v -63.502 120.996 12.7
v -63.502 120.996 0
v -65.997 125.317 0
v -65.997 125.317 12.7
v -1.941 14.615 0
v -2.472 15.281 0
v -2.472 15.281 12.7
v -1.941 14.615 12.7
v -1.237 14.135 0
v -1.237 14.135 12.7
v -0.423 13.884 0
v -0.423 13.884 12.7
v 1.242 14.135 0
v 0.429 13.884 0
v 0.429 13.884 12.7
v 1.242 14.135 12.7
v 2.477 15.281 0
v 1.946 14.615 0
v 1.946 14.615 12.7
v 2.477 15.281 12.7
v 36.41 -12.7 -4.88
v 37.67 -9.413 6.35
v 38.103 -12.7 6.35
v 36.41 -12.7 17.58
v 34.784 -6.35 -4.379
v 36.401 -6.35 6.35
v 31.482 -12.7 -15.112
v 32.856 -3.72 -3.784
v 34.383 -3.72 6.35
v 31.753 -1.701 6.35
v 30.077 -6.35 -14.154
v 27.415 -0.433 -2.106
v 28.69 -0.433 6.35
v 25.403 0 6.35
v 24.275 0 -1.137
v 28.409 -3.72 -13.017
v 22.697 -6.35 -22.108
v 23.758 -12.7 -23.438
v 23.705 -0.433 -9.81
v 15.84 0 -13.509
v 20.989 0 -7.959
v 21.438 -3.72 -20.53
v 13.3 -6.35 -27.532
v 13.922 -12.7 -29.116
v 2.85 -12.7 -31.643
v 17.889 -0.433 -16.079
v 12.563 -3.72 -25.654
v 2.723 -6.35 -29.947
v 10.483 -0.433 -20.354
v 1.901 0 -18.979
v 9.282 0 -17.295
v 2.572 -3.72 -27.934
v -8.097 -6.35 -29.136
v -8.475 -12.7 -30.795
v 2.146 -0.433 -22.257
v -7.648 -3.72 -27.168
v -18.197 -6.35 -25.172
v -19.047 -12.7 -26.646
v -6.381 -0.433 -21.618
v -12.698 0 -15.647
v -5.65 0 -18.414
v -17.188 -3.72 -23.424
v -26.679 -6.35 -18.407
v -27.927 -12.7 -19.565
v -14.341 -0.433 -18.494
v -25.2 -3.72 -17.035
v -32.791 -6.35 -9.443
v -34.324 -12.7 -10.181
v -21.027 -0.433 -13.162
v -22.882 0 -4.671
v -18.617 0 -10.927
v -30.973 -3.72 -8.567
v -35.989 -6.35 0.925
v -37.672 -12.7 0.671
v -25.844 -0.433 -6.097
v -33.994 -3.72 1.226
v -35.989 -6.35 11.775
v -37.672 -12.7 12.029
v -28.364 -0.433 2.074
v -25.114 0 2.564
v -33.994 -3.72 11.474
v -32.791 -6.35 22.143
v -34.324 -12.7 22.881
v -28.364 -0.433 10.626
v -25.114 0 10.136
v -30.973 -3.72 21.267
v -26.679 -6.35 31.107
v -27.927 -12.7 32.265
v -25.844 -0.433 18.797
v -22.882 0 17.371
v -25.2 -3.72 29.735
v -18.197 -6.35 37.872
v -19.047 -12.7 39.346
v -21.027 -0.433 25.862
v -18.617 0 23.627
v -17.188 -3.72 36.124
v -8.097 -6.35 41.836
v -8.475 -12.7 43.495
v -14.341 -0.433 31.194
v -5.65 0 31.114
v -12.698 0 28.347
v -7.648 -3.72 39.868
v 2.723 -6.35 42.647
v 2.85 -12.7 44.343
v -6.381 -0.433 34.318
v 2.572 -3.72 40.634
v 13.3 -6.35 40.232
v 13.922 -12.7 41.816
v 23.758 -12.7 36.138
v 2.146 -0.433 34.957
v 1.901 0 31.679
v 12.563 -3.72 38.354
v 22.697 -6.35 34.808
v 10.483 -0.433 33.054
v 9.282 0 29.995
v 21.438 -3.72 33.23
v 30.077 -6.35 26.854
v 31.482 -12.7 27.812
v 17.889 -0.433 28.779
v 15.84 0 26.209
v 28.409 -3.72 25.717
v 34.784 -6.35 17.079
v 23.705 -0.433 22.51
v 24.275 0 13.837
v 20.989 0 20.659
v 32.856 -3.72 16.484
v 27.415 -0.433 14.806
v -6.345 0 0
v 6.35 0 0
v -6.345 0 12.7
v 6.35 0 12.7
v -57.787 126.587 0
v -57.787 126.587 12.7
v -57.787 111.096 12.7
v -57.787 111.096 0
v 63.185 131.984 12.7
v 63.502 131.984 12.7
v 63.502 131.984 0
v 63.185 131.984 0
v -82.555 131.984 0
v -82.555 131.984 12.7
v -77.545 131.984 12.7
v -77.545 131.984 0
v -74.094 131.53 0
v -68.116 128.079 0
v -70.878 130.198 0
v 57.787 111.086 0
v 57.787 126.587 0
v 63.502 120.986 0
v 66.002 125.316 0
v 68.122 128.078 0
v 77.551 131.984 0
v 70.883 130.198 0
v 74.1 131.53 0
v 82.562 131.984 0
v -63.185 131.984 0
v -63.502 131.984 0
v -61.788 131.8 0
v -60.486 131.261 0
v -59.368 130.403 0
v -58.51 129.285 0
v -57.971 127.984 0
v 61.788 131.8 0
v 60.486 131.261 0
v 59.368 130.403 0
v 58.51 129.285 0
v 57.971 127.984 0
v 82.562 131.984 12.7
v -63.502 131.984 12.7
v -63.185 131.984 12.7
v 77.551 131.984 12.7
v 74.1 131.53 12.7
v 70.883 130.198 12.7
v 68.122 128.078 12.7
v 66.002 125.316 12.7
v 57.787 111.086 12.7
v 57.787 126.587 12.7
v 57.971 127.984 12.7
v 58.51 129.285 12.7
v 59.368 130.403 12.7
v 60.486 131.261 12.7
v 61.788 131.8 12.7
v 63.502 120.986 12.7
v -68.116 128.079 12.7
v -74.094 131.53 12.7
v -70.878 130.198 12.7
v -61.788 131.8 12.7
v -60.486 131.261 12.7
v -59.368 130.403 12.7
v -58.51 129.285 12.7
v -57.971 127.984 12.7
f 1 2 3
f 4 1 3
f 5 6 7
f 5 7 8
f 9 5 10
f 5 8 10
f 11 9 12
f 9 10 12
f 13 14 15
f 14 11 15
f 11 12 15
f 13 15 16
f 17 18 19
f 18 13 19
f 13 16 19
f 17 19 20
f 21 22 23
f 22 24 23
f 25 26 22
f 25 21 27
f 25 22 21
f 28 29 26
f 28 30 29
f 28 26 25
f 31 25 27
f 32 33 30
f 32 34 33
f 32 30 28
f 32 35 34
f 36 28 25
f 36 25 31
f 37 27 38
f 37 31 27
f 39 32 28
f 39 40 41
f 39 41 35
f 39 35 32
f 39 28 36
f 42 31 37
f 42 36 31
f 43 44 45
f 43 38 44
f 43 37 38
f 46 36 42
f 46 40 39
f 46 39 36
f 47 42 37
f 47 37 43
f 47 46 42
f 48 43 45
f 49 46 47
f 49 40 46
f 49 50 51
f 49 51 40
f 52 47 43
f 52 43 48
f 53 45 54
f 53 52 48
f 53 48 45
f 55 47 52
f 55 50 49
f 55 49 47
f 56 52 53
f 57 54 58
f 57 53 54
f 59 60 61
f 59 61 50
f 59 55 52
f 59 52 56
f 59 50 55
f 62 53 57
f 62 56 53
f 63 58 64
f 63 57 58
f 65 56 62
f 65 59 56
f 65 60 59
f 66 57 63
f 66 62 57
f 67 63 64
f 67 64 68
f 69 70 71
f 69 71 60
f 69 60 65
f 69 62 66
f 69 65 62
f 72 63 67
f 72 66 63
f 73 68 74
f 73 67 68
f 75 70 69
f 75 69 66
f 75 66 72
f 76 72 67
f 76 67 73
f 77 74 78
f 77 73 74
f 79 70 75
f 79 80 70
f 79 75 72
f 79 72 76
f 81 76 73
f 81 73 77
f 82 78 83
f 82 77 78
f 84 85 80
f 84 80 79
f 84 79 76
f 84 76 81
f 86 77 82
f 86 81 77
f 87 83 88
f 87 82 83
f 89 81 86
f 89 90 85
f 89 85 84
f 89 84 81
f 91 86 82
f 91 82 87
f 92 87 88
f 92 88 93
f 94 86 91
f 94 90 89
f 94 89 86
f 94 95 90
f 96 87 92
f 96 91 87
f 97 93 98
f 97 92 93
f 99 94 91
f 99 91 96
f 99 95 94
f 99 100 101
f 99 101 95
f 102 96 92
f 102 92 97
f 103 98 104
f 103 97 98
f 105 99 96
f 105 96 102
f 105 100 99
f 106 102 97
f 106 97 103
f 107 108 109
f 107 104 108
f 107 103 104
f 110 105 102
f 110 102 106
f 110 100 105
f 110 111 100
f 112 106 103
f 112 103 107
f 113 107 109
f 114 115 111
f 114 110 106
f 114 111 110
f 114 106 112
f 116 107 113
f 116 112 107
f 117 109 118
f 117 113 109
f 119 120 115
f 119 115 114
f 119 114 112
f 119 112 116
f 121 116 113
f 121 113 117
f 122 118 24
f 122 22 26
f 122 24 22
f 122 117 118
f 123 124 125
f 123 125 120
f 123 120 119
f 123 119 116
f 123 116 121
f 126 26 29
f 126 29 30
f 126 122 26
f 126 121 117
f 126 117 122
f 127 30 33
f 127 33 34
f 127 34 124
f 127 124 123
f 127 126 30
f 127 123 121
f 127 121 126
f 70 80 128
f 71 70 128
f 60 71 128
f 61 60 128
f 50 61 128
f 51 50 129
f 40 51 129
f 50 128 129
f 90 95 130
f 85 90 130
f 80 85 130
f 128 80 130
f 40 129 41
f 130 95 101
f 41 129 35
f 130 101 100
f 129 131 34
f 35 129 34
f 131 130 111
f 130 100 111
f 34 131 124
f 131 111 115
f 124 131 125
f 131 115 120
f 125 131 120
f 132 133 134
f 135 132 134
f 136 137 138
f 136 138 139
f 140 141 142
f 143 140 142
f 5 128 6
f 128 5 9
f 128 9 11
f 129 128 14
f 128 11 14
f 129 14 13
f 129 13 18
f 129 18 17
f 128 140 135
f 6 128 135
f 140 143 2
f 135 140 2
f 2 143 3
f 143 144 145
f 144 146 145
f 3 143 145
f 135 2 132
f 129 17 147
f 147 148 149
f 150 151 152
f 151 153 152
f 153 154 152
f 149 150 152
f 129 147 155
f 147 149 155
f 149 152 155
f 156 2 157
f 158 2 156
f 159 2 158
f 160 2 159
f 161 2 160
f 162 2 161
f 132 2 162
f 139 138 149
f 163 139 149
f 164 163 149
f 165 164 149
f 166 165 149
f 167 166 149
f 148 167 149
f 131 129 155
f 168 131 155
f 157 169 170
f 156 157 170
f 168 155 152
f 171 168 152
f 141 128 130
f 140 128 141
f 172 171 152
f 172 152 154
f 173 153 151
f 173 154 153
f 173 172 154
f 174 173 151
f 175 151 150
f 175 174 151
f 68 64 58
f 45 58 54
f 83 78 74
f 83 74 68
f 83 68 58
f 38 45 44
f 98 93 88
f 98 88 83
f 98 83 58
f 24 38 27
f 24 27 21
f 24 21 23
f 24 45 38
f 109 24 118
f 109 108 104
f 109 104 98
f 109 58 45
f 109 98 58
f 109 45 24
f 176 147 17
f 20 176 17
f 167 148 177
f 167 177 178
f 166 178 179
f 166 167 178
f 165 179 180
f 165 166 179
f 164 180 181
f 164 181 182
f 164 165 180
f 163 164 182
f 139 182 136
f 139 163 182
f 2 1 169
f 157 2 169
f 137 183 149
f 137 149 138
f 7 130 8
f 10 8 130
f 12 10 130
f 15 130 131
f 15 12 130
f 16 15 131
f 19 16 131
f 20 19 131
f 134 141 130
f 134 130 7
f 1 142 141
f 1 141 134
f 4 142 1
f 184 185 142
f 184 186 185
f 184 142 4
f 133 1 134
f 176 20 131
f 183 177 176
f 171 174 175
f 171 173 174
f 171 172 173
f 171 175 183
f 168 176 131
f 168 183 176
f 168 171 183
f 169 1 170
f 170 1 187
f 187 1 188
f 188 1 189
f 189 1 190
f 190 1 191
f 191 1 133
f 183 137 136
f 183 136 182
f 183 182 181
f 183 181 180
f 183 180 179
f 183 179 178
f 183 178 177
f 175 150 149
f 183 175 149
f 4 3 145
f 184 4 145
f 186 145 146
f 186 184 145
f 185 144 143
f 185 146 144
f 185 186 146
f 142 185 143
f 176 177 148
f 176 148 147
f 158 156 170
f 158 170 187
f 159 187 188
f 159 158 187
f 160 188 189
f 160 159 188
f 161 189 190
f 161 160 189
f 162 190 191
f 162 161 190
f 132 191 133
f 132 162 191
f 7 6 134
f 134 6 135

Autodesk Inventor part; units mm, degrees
ref_plane "YZ Plane" through (0, 0, 0) normal (1, 0, 0) x (0, 1, 0)
ref_plane "XZ Plane" through (0, 0, 0) normal (0, 1, 0) x (-1, 0, 0)
ref_plane "XY Plane" through (0, 0, 0) normal (0, 0, 1) x (1, 0, 0)
sketch "Sketch1" plane through (0, 0, 0) normal (0, 0, 1) x (1, 0, 0)
  line L0 (0, 0) -> (6.35, 0)
  line L1 (0, 0) -> (-6.3448, 0)
  line L2 (6.35, 0) -> (82.5616, 131.9842)
  line L3 (82.5616, 131.9842) -> (69.8518, 131.9842)
  line L4 (69.8518, 131.9842) -> (0.0026, 10.9947)
  line L5 (0.0026, 10.9947) -> (-69.8461, 131.9845)
  line L6 (-6.3448, 0) -> (-82.5554, 131.9845)
  line L7 (-82.5554, 131.9845) -> (-69.8461, 131.9845)
  dimension "d2" = 6.35
extrude "Extrusion1" add sketch "Sketch1" along normal blind 12.7
sketch "Sketch2" plane through (-6.3448, 0, 0) normal (0, -1, 0) x (1, 0, 0)
  circle A0 centre (6.3474, 6.35) radius 38.1
  point P0 (6.3448, 0)
  dimension "d7" = 76.2
extrude "Extrusion2" add sketch "Sketch2" along normal blind 12.7
fillet "Fillet1" radius 12.7 1 edges at (-38.0974, 0, 6.35)
fillet "Fillet2" radius 2.8575 1 edges at (0.0026, 10.9947, 6.35)
sketch "Sketch4" plane through (0, 0, 12.7) normal (0, 0, 1) x (1, 0, 0)
  line L0 (82.5616, 131.9842) -> (69.8518, 131.9842) construction
  line L1 (69.8518, 131.9842) -> (2.4773, 15.2813) construction
  line L2 (63.5021, 120.9855) -> (63.5021, 131.9842)
  line L3 (63.5021, 131.9842) -> (57.7871, 131.9842)
  line L4 (57.7871, 131.9842) -> (57.7871, 111.0863)
  line L5 (-63.5021, 120.9855) -> (-63.5021, 131.9842)
  line L6 (-63.5021, 131.9842) -> (-57.7871, 131.9842)
  line L7 (-57.7871, 131.9842) -> (-57.7871, 111.0862)
  line L8 (-63.5021, 120.9855) -> (-57.7871, 111.0862)
  line L9 (-2.4721, 15.2813) -> (-69.8461, 131.9845) projected
  line L10 (57.7871, 111.0863) -> (63.5021, 120.9855)
  point P0 (0, 0)
  dimension "d19" = 12.7
  dimension "d20" = 5.715
extrude "Extrusion4" add sketch "Sketch4" against normal blind 12.7
fillet "Fillet5" radius 5.3975 2 edges at (57.7871, 131.9842, 6.35) (-57.7871, 131.9842, 6.35)
fillet "Fillet6" radius 13.335 2 edges at (69.8518, 131.9842, 6.35) (-69.8461, 131.9845, 6.35)
properties part number "mask holder" material "Rubber"
